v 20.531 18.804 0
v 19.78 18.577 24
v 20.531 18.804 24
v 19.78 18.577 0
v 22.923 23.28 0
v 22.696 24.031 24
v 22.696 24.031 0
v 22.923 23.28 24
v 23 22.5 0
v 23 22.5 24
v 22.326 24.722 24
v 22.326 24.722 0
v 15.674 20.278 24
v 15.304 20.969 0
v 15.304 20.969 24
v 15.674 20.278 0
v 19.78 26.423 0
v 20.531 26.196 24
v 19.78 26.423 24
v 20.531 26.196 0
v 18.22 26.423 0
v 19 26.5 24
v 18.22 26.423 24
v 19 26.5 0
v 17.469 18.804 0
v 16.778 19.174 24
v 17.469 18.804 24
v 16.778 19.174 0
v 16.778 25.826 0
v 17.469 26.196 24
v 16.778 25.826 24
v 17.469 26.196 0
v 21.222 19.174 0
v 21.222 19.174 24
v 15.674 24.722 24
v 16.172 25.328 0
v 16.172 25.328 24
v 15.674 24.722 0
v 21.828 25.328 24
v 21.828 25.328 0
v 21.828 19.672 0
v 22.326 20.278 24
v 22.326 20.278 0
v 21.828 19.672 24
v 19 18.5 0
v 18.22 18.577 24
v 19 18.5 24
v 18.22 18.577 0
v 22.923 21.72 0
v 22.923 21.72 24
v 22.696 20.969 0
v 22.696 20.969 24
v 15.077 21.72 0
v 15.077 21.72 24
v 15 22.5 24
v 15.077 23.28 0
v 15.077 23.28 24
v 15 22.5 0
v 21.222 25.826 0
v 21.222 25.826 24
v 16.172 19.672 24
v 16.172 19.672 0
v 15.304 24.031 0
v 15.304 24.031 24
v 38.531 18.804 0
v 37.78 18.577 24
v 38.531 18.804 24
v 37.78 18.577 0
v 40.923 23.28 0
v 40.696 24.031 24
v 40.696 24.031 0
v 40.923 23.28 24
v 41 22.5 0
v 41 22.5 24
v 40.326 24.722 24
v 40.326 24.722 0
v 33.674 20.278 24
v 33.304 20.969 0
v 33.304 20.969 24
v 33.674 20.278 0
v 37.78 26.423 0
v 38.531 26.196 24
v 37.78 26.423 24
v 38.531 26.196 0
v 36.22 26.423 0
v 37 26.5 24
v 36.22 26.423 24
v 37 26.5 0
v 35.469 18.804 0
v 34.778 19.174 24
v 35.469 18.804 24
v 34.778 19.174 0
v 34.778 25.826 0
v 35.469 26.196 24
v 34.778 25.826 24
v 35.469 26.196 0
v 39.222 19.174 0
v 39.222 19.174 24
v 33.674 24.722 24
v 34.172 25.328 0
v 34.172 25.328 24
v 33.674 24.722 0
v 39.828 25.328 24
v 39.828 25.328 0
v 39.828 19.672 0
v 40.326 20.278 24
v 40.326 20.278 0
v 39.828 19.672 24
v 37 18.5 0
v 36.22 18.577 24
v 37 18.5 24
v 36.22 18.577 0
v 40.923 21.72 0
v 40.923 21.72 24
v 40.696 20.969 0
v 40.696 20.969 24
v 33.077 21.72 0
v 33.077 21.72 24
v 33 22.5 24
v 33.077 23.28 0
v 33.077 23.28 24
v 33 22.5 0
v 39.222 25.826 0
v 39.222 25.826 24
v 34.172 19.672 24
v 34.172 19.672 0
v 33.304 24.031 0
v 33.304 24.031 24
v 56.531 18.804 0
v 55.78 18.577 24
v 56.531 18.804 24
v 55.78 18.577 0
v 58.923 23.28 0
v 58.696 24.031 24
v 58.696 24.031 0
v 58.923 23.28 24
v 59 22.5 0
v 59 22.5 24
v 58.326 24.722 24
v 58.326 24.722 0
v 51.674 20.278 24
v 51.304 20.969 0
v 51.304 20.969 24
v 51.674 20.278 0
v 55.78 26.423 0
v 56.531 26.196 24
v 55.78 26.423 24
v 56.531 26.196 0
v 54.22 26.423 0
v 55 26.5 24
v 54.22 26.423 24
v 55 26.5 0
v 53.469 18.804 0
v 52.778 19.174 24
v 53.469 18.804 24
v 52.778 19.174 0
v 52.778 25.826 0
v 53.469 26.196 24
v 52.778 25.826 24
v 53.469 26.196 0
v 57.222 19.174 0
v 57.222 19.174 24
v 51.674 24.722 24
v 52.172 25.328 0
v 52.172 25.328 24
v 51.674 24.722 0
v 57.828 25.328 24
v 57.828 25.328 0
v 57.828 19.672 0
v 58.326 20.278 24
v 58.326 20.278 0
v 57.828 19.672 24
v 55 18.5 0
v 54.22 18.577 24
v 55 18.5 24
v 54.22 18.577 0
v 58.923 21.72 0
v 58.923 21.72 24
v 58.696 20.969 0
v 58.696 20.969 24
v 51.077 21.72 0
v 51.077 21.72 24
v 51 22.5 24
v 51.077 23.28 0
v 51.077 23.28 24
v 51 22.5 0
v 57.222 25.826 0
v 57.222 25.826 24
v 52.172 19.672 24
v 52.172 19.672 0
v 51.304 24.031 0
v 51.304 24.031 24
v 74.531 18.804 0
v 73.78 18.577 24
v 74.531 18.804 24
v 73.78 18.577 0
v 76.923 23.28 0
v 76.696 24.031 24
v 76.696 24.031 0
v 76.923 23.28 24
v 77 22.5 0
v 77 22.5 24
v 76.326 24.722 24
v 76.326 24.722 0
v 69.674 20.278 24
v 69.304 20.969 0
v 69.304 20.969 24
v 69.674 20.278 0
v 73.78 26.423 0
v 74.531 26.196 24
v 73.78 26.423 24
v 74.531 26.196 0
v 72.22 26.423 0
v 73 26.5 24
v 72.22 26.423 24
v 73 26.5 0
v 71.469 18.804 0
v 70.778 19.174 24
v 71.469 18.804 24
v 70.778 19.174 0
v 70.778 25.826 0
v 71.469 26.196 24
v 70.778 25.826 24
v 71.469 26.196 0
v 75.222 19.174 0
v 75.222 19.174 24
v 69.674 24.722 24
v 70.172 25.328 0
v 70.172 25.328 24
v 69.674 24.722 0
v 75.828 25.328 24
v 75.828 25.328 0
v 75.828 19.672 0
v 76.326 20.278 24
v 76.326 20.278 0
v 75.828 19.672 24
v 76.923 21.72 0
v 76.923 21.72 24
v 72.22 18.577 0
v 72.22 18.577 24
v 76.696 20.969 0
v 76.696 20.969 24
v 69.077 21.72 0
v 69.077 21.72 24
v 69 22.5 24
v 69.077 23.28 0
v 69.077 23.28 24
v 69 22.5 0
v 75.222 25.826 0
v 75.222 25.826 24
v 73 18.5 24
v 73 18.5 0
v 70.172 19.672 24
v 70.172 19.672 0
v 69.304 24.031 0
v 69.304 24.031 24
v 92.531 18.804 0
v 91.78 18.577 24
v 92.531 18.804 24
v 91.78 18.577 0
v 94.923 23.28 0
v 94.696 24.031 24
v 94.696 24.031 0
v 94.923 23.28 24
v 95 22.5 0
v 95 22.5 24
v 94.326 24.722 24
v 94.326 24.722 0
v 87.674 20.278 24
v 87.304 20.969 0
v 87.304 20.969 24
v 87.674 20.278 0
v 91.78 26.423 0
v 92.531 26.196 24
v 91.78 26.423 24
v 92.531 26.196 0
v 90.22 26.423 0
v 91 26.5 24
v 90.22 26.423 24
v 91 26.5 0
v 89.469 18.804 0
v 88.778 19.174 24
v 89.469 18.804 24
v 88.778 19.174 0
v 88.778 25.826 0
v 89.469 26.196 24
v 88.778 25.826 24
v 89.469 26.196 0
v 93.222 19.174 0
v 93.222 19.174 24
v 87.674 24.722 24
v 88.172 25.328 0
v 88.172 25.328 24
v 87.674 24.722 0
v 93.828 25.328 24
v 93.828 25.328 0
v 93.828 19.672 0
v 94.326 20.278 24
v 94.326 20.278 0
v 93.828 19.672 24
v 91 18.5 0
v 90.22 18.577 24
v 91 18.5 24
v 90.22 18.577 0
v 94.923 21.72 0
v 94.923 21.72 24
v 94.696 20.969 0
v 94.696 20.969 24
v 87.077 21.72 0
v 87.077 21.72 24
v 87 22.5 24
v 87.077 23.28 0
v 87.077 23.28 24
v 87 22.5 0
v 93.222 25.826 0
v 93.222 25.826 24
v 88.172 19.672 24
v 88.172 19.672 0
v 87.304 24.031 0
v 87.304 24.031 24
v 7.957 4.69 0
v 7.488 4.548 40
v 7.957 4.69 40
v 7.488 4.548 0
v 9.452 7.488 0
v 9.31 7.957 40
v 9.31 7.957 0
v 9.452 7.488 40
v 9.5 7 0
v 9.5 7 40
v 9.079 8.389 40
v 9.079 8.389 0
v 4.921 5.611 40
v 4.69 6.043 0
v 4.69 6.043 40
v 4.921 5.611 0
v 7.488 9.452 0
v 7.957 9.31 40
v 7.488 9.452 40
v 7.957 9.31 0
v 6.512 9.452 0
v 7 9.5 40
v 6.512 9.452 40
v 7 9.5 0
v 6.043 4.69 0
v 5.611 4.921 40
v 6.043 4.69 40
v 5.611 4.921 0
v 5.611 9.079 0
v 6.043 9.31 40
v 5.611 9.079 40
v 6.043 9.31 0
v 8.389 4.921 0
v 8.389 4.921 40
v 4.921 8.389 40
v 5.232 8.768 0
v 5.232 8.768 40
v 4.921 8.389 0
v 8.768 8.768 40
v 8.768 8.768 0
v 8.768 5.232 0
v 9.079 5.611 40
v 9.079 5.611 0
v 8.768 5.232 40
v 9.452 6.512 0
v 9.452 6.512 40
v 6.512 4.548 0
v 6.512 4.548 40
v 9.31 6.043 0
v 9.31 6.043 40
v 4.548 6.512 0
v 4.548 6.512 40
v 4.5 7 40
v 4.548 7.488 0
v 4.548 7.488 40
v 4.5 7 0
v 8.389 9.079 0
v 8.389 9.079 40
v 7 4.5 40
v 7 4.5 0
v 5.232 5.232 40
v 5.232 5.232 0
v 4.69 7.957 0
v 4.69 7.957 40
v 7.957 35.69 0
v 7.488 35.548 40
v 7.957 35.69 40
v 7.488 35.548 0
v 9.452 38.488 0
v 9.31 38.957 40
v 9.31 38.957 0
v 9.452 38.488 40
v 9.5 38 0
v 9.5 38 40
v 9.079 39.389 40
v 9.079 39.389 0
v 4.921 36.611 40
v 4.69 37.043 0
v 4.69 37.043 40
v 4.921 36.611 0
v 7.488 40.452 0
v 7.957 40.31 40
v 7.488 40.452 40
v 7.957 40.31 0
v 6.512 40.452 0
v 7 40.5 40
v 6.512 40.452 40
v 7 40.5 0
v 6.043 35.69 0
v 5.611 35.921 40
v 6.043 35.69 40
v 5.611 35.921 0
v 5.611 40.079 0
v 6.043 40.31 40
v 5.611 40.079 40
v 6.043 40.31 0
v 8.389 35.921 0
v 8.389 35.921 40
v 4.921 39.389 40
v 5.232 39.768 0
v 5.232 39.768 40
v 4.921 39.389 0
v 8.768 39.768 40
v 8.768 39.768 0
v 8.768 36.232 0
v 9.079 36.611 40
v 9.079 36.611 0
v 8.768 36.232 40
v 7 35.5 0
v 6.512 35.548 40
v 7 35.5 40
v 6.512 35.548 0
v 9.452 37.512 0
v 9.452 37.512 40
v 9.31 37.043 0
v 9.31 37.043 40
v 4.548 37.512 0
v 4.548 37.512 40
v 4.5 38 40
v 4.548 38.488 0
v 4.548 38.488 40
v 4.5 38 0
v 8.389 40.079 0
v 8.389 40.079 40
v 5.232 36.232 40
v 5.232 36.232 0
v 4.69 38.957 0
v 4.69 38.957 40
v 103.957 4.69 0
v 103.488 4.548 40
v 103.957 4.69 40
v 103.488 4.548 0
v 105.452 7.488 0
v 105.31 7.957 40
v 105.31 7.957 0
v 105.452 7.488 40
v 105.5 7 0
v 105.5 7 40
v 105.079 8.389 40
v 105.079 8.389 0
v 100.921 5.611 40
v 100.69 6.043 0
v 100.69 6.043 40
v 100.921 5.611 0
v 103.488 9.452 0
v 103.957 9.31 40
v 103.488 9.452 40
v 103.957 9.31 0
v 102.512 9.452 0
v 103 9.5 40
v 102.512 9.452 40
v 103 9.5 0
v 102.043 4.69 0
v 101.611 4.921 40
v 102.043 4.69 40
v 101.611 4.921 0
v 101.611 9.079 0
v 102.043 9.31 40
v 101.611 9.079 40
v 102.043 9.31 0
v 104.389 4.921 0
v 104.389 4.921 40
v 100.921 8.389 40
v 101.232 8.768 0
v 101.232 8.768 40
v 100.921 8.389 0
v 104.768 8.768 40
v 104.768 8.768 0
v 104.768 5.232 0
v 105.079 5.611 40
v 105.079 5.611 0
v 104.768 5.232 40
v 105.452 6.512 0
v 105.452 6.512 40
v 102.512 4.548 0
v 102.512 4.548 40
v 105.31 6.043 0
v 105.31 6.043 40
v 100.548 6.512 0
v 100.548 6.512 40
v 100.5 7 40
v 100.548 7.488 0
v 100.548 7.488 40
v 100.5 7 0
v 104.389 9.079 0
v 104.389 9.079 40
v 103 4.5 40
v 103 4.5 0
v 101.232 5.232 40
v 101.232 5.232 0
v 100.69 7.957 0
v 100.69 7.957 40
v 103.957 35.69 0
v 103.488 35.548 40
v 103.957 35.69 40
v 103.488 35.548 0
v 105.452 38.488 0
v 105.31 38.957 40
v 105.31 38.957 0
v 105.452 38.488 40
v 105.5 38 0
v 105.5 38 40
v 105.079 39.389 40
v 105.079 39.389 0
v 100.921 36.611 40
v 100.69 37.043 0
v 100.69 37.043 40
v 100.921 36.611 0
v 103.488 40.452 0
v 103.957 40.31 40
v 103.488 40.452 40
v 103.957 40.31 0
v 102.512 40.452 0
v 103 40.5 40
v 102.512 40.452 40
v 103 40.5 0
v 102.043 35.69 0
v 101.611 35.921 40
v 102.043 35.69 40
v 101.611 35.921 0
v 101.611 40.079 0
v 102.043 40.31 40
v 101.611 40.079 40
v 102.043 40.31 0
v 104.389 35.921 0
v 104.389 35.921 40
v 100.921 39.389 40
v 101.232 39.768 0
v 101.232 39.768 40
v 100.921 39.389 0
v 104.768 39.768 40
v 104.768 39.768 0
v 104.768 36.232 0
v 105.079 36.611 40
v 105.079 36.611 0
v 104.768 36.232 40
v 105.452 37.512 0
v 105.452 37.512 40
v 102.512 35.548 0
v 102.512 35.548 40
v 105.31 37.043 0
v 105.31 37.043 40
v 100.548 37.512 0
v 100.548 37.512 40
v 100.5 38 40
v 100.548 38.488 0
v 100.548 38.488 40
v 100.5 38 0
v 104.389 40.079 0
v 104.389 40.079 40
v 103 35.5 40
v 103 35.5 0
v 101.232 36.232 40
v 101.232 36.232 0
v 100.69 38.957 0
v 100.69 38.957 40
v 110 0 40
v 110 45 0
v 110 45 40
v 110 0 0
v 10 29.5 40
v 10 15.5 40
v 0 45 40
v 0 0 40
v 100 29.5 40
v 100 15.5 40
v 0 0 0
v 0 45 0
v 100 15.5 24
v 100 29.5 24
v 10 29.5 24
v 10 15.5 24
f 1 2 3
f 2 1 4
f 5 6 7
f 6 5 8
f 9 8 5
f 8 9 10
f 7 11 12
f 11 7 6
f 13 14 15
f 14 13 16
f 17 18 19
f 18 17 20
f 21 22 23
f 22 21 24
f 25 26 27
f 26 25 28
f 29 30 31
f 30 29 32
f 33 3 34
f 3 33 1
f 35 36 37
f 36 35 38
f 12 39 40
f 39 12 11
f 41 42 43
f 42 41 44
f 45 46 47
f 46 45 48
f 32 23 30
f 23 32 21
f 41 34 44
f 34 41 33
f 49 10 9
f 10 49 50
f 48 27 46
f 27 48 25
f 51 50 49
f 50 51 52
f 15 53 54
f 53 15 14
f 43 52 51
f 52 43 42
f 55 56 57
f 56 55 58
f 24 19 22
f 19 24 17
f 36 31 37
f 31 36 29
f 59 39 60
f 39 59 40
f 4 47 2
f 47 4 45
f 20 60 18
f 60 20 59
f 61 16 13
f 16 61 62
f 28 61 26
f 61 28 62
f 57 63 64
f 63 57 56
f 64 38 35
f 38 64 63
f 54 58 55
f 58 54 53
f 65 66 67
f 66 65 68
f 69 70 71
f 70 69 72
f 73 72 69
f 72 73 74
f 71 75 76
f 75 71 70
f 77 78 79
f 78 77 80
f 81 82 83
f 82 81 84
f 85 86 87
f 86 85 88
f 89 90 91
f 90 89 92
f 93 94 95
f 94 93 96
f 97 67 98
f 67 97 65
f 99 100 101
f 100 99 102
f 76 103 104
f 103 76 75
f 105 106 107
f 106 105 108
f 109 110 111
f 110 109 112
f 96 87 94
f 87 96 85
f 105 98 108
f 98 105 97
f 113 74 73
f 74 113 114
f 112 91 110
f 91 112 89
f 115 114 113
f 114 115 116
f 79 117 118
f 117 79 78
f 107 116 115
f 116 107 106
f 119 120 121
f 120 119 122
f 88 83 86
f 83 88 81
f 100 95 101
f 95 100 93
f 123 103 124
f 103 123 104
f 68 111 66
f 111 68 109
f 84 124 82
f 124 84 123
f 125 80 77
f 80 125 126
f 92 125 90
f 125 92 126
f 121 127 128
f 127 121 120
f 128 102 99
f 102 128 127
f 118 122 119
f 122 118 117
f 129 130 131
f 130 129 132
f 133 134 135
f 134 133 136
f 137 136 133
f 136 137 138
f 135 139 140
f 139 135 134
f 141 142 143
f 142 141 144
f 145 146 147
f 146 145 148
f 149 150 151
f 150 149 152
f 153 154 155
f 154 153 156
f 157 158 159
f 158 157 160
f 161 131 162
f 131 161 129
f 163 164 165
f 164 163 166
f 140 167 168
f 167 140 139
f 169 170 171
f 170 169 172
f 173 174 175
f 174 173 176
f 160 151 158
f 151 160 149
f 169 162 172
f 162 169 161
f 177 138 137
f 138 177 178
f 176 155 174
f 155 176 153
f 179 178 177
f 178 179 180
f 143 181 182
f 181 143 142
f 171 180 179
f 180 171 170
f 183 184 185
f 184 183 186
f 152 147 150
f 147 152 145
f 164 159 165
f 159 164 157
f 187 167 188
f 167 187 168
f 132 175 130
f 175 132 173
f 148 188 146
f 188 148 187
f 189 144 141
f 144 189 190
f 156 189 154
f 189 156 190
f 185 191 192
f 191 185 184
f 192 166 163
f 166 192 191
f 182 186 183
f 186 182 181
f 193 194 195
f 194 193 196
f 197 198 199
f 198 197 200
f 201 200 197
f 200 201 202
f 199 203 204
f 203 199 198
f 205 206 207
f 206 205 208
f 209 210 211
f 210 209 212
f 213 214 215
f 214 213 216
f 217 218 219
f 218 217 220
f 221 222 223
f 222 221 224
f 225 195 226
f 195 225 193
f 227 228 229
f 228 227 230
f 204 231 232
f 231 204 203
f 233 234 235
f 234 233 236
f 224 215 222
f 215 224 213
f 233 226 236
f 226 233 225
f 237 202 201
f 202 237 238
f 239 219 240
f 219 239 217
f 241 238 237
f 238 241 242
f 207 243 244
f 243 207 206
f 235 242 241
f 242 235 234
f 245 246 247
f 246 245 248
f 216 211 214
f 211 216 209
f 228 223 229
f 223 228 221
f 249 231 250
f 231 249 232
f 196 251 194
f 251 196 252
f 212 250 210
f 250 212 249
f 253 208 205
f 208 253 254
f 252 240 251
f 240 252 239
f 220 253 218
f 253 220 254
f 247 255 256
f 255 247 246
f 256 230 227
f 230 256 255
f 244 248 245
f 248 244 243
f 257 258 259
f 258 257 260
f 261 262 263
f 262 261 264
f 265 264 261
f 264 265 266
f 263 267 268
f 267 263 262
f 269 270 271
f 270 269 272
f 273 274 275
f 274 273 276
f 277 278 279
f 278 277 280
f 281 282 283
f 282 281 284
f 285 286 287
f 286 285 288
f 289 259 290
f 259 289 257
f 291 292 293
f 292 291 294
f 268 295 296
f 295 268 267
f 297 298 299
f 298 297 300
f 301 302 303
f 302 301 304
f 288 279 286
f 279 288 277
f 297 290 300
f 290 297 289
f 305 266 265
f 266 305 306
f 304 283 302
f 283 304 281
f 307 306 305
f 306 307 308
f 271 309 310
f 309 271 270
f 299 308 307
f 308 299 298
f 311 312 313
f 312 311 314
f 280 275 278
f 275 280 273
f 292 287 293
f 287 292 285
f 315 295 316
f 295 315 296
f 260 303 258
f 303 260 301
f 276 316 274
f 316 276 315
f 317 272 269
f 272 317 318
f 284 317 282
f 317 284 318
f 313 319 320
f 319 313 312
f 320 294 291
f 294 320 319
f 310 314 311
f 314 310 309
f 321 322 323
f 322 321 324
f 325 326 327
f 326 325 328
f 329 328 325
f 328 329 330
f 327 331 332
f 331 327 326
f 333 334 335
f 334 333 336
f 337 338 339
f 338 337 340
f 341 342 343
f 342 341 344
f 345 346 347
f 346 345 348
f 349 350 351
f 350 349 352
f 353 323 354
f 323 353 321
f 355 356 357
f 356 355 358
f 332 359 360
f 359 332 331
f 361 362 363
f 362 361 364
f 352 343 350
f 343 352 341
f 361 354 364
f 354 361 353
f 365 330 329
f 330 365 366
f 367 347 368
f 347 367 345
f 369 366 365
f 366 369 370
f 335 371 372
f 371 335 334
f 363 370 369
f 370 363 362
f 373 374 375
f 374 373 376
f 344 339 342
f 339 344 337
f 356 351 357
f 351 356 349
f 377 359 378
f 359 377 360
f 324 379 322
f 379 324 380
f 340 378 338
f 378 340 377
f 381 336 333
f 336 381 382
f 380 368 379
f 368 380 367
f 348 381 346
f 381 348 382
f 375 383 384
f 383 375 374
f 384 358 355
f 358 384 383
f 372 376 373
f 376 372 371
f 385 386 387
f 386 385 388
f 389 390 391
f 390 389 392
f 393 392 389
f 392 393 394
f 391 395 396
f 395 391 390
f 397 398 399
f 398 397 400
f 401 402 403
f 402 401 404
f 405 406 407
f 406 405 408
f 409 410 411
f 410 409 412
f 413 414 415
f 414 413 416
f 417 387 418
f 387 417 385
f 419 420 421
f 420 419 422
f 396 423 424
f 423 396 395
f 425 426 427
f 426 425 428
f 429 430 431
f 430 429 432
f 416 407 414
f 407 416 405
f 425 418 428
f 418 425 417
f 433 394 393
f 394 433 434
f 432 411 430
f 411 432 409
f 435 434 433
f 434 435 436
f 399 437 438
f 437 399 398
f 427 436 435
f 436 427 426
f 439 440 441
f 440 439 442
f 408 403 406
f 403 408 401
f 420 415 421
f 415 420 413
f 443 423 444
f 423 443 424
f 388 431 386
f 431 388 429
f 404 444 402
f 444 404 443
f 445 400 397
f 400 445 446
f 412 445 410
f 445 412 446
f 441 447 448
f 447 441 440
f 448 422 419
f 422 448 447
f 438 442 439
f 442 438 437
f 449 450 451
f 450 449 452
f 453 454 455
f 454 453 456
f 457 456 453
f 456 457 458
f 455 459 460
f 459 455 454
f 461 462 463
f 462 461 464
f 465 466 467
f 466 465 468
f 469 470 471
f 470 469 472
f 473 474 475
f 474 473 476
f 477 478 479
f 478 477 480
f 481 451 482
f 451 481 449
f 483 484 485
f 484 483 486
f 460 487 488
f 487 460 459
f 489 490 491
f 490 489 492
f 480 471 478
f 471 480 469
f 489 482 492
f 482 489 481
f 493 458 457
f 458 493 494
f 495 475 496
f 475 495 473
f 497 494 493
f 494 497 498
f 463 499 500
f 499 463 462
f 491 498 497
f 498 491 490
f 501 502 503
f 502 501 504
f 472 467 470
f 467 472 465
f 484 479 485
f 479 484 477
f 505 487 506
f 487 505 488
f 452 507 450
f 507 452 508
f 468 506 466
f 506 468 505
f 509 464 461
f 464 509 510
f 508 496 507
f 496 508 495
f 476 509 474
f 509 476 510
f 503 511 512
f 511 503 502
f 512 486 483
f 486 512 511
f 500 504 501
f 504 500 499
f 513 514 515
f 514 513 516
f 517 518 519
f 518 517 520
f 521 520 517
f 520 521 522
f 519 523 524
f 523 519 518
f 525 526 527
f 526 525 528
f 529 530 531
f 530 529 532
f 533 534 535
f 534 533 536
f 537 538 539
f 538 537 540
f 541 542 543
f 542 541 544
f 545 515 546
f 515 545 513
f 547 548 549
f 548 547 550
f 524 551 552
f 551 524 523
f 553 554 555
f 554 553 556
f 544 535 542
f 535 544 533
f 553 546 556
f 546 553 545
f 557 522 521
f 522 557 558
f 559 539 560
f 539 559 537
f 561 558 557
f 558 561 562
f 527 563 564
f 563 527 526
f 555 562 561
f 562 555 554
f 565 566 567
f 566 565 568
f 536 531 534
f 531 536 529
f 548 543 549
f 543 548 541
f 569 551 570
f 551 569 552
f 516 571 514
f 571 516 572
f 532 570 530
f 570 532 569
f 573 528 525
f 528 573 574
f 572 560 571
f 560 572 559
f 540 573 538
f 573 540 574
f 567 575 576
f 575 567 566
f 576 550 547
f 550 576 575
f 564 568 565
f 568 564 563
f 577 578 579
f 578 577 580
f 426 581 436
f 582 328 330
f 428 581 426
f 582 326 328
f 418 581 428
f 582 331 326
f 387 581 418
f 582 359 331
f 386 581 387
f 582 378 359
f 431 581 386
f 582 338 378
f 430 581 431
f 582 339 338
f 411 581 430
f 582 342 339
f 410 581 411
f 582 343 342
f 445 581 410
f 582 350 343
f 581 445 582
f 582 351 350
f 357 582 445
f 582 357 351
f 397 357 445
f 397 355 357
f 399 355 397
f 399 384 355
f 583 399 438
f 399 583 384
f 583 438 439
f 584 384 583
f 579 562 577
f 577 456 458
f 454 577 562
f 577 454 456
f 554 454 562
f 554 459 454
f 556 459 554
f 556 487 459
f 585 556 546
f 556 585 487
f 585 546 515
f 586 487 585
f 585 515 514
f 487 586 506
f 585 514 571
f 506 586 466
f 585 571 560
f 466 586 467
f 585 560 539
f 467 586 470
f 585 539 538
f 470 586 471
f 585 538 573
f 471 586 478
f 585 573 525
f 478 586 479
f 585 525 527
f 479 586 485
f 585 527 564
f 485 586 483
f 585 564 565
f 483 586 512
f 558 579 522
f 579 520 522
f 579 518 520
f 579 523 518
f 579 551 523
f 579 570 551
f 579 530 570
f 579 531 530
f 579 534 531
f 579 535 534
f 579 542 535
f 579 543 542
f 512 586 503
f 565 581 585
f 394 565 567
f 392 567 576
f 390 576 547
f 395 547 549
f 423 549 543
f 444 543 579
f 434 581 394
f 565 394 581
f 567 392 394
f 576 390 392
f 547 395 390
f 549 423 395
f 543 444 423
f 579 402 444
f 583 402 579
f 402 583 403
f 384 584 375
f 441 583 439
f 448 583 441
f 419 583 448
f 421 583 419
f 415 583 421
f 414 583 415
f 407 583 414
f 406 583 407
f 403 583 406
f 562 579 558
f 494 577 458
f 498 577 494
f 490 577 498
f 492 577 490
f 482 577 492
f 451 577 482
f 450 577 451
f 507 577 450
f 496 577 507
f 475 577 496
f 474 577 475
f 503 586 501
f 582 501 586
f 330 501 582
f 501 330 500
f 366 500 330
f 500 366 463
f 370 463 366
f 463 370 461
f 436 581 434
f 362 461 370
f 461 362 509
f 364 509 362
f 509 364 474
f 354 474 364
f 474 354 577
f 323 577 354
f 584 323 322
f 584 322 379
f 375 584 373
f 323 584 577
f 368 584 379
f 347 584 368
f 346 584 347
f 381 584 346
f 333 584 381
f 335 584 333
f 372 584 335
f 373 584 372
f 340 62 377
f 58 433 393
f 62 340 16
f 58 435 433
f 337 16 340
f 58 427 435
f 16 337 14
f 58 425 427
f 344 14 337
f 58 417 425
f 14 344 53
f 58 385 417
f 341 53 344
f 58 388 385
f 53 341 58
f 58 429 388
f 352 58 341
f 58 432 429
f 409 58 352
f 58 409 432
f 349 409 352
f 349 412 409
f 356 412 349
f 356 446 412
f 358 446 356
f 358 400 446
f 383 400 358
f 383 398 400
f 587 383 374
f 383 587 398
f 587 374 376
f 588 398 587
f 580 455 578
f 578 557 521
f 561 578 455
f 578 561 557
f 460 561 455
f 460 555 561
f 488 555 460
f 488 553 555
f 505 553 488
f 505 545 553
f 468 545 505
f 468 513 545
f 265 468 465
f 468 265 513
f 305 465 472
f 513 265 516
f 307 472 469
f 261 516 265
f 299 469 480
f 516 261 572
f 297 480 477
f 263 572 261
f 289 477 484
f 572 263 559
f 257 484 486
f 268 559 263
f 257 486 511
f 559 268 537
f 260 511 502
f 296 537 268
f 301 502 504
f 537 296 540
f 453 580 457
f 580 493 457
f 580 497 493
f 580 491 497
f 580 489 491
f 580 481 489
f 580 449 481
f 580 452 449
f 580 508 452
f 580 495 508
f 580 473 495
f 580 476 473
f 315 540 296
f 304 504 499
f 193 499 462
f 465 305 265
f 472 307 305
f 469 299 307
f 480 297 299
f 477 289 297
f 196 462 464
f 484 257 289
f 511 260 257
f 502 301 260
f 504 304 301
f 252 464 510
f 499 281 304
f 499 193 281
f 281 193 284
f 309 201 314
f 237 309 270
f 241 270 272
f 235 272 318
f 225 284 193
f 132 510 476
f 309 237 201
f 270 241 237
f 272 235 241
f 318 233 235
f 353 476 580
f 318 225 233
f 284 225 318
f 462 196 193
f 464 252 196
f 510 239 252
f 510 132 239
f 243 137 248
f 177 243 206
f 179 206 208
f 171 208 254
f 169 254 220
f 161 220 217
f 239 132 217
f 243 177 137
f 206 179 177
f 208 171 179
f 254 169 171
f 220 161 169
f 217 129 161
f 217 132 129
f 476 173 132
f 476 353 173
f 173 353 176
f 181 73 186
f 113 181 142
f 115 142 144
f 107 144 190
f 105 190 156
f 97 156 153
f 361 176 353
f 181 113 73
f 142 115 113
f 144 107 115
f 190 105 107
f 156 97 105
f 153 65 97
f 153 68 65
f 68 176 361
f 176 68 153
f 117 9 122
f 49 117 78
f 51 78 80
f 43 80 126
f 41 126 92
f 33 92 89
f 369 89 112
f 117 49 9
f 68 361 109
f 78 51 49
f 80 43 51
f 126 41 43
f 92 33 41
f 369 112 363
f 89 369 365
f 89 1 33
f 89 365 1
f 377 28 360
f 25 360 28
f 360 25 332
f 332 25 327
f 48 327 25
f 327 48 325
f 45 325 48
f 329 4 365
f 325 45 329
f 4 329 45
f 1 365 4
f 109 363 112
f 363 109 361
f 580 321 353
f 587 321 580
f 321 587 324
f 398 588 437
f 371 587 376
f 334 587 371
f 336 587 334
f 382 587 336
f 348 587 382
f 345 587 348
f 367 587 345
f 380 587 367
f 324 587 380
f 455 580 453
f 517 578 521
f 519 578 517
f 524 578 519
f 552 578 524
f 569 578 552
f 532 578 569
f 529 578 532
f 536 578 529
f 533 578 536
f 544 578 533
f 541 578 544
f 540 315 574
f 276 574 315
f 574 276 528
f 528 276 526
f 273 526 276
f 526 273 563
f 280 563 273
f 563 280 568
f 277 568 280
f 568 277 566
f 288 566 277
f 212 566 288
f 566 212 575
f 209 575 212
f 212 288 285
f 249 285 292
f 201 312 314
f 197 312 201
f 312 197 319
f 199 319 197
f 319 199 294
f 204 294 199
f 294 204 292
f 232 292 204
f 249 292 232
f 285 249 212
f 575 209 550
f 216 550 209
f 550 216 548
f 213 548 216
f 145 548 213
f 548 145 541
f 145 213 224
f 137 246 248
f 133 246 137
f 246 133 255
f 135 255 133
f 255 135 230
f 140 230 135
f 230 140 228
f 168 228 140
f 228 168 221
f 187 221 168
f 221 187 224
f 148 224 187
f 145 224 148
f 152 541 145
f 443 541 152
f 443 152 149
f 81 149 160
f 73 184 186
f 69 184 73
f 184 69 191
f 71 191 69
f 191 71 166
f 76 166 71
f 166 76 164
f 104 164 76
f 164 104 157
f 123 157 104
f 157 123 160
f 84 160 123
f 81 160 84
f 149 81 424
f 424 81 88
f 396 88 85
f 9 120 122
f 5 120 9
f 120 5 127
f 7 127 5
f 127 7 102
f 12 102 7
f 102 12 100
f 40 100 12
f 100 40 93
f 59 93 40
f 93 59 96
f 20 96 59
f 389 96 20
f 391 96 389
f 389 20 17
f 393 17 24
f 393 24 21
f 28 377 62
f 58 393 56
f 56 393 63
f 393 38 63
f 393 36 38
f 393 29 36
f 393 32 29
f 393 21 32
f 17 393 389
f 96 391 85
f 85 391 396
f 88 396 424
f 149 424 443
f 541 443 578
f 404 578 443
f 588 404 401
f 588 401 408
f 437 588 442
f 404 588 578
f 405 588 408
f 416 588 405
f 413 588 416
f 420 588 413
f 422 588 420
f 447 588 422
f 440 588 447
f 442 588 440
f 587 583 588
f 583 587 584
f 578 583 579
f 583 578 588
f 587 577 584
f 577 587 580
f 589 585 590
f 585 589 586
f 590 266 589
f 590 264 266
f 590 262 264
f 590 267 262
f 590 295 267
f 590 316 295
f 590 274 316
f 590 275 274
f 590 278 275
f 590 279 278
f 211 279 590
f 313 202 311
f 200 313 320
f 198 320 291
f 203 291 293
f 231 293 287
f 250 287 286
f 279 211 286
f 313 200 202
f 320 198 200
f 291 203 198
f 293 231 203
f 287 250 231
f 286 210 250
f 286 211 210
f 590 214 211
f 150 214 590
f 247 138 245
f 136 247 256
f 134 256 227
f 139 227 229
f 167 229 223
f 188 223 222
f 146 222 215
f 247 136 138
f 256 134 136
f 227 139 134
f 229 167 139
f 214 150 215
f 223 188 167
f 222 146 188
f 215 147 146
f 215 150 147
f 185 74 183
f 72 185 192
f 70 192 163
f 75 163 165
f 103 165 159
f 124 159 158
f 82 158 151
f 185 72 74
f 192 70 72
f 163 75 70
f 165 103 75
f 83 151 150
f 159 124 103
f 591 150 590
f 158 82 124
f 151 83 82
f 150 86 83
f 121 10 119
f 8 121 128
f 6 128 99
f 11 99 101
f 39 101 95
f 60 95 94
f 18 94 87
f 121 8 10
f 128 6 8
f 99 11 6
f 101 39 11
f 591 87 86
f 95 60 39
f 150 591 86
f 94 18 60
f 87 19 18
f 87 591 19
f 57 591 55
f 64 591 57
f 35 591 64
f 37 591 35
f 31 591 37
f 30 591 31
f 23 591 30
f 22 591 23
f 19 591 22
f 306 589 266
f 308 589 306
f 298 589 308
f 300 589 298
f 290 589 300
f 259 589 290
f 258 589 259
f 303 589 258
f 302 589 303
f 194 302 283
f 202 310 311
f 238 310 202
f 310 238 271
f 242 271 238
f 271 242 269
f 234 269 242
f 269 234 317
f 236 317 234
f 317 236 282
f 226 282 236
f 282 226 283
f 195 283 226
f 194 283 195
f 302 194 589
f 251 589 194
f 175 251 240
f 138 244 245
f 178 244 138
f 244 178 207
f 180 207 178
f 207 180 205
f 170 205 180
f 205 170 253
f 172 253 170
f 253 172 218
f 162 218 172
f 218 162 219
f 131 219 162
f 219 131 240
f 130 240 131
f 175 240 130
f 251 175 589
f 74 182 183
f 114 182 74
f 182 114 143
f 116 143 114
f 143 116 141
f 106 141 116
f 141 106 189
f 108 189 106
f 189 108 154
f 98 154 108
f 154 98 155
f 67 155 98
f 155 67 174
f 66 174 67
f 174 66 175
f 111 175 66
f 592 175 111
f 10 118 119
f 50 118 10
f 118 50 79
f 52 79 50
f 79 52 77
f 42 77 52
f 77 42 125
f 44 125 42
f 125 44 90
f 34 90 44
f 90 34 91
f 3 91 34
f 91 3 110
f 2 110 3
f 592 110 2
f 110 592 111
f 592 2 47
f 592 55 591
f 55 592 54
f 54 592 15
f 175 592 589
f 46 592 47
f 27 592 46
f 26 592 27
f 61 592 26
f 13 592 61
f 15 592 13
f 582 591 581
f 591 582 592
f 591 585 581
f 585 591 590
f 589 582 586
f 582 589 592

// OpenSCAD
$fn = 32;

// ----------------------------------------------------------------------
// Manifold block: gallery_top manifold
// ----------------------------------------------------------------------

// --- parameters (mm) ---
block_l = 110;            // block length, X
block_w = 45;             // block width, Y
block_h = 40;             // block height, Z
port_d = 8;               // port bore diameter
port_pitch = 18;          // port pitch along X
gallery_d = 14;           // top gallery width, Y
gallery_depth = 16;       // gallery pocket depth
wall_p = 10;              // gallery end wall thickness, X
mnt_d = 5;                // mounting hole diameter
mnt_in = 7;               // mounting hole inset from the edges

n_ports = 5;  // ports in the row
port_x0 = (block_l - (n_ports - 1) * port_pitch) / 2;  // first port X

difference() {
  cube([block_l, block_w, block_h]);
  for (i = [0 : n_ports - 1])
    translate([port_x0 + i * port_pitch, block_w / 2, -1])
      cylinder(h = block_h + 2, d = port_d);
  translate([wall_p, block_w / 2 - gallery_d / 2, block_h - gallery_depth])
    cube([block_l - 2 * wall_p, gallery_d, gallery_depth + 1]);
  for (cx = [mnt_in, block_l - mnt_in])
    for (cy = [mnt_in, block_w - mnt_in])
      translate([cx, cy, -1]) cylinder(h = block_h + 2, d = mnt_d);
}
